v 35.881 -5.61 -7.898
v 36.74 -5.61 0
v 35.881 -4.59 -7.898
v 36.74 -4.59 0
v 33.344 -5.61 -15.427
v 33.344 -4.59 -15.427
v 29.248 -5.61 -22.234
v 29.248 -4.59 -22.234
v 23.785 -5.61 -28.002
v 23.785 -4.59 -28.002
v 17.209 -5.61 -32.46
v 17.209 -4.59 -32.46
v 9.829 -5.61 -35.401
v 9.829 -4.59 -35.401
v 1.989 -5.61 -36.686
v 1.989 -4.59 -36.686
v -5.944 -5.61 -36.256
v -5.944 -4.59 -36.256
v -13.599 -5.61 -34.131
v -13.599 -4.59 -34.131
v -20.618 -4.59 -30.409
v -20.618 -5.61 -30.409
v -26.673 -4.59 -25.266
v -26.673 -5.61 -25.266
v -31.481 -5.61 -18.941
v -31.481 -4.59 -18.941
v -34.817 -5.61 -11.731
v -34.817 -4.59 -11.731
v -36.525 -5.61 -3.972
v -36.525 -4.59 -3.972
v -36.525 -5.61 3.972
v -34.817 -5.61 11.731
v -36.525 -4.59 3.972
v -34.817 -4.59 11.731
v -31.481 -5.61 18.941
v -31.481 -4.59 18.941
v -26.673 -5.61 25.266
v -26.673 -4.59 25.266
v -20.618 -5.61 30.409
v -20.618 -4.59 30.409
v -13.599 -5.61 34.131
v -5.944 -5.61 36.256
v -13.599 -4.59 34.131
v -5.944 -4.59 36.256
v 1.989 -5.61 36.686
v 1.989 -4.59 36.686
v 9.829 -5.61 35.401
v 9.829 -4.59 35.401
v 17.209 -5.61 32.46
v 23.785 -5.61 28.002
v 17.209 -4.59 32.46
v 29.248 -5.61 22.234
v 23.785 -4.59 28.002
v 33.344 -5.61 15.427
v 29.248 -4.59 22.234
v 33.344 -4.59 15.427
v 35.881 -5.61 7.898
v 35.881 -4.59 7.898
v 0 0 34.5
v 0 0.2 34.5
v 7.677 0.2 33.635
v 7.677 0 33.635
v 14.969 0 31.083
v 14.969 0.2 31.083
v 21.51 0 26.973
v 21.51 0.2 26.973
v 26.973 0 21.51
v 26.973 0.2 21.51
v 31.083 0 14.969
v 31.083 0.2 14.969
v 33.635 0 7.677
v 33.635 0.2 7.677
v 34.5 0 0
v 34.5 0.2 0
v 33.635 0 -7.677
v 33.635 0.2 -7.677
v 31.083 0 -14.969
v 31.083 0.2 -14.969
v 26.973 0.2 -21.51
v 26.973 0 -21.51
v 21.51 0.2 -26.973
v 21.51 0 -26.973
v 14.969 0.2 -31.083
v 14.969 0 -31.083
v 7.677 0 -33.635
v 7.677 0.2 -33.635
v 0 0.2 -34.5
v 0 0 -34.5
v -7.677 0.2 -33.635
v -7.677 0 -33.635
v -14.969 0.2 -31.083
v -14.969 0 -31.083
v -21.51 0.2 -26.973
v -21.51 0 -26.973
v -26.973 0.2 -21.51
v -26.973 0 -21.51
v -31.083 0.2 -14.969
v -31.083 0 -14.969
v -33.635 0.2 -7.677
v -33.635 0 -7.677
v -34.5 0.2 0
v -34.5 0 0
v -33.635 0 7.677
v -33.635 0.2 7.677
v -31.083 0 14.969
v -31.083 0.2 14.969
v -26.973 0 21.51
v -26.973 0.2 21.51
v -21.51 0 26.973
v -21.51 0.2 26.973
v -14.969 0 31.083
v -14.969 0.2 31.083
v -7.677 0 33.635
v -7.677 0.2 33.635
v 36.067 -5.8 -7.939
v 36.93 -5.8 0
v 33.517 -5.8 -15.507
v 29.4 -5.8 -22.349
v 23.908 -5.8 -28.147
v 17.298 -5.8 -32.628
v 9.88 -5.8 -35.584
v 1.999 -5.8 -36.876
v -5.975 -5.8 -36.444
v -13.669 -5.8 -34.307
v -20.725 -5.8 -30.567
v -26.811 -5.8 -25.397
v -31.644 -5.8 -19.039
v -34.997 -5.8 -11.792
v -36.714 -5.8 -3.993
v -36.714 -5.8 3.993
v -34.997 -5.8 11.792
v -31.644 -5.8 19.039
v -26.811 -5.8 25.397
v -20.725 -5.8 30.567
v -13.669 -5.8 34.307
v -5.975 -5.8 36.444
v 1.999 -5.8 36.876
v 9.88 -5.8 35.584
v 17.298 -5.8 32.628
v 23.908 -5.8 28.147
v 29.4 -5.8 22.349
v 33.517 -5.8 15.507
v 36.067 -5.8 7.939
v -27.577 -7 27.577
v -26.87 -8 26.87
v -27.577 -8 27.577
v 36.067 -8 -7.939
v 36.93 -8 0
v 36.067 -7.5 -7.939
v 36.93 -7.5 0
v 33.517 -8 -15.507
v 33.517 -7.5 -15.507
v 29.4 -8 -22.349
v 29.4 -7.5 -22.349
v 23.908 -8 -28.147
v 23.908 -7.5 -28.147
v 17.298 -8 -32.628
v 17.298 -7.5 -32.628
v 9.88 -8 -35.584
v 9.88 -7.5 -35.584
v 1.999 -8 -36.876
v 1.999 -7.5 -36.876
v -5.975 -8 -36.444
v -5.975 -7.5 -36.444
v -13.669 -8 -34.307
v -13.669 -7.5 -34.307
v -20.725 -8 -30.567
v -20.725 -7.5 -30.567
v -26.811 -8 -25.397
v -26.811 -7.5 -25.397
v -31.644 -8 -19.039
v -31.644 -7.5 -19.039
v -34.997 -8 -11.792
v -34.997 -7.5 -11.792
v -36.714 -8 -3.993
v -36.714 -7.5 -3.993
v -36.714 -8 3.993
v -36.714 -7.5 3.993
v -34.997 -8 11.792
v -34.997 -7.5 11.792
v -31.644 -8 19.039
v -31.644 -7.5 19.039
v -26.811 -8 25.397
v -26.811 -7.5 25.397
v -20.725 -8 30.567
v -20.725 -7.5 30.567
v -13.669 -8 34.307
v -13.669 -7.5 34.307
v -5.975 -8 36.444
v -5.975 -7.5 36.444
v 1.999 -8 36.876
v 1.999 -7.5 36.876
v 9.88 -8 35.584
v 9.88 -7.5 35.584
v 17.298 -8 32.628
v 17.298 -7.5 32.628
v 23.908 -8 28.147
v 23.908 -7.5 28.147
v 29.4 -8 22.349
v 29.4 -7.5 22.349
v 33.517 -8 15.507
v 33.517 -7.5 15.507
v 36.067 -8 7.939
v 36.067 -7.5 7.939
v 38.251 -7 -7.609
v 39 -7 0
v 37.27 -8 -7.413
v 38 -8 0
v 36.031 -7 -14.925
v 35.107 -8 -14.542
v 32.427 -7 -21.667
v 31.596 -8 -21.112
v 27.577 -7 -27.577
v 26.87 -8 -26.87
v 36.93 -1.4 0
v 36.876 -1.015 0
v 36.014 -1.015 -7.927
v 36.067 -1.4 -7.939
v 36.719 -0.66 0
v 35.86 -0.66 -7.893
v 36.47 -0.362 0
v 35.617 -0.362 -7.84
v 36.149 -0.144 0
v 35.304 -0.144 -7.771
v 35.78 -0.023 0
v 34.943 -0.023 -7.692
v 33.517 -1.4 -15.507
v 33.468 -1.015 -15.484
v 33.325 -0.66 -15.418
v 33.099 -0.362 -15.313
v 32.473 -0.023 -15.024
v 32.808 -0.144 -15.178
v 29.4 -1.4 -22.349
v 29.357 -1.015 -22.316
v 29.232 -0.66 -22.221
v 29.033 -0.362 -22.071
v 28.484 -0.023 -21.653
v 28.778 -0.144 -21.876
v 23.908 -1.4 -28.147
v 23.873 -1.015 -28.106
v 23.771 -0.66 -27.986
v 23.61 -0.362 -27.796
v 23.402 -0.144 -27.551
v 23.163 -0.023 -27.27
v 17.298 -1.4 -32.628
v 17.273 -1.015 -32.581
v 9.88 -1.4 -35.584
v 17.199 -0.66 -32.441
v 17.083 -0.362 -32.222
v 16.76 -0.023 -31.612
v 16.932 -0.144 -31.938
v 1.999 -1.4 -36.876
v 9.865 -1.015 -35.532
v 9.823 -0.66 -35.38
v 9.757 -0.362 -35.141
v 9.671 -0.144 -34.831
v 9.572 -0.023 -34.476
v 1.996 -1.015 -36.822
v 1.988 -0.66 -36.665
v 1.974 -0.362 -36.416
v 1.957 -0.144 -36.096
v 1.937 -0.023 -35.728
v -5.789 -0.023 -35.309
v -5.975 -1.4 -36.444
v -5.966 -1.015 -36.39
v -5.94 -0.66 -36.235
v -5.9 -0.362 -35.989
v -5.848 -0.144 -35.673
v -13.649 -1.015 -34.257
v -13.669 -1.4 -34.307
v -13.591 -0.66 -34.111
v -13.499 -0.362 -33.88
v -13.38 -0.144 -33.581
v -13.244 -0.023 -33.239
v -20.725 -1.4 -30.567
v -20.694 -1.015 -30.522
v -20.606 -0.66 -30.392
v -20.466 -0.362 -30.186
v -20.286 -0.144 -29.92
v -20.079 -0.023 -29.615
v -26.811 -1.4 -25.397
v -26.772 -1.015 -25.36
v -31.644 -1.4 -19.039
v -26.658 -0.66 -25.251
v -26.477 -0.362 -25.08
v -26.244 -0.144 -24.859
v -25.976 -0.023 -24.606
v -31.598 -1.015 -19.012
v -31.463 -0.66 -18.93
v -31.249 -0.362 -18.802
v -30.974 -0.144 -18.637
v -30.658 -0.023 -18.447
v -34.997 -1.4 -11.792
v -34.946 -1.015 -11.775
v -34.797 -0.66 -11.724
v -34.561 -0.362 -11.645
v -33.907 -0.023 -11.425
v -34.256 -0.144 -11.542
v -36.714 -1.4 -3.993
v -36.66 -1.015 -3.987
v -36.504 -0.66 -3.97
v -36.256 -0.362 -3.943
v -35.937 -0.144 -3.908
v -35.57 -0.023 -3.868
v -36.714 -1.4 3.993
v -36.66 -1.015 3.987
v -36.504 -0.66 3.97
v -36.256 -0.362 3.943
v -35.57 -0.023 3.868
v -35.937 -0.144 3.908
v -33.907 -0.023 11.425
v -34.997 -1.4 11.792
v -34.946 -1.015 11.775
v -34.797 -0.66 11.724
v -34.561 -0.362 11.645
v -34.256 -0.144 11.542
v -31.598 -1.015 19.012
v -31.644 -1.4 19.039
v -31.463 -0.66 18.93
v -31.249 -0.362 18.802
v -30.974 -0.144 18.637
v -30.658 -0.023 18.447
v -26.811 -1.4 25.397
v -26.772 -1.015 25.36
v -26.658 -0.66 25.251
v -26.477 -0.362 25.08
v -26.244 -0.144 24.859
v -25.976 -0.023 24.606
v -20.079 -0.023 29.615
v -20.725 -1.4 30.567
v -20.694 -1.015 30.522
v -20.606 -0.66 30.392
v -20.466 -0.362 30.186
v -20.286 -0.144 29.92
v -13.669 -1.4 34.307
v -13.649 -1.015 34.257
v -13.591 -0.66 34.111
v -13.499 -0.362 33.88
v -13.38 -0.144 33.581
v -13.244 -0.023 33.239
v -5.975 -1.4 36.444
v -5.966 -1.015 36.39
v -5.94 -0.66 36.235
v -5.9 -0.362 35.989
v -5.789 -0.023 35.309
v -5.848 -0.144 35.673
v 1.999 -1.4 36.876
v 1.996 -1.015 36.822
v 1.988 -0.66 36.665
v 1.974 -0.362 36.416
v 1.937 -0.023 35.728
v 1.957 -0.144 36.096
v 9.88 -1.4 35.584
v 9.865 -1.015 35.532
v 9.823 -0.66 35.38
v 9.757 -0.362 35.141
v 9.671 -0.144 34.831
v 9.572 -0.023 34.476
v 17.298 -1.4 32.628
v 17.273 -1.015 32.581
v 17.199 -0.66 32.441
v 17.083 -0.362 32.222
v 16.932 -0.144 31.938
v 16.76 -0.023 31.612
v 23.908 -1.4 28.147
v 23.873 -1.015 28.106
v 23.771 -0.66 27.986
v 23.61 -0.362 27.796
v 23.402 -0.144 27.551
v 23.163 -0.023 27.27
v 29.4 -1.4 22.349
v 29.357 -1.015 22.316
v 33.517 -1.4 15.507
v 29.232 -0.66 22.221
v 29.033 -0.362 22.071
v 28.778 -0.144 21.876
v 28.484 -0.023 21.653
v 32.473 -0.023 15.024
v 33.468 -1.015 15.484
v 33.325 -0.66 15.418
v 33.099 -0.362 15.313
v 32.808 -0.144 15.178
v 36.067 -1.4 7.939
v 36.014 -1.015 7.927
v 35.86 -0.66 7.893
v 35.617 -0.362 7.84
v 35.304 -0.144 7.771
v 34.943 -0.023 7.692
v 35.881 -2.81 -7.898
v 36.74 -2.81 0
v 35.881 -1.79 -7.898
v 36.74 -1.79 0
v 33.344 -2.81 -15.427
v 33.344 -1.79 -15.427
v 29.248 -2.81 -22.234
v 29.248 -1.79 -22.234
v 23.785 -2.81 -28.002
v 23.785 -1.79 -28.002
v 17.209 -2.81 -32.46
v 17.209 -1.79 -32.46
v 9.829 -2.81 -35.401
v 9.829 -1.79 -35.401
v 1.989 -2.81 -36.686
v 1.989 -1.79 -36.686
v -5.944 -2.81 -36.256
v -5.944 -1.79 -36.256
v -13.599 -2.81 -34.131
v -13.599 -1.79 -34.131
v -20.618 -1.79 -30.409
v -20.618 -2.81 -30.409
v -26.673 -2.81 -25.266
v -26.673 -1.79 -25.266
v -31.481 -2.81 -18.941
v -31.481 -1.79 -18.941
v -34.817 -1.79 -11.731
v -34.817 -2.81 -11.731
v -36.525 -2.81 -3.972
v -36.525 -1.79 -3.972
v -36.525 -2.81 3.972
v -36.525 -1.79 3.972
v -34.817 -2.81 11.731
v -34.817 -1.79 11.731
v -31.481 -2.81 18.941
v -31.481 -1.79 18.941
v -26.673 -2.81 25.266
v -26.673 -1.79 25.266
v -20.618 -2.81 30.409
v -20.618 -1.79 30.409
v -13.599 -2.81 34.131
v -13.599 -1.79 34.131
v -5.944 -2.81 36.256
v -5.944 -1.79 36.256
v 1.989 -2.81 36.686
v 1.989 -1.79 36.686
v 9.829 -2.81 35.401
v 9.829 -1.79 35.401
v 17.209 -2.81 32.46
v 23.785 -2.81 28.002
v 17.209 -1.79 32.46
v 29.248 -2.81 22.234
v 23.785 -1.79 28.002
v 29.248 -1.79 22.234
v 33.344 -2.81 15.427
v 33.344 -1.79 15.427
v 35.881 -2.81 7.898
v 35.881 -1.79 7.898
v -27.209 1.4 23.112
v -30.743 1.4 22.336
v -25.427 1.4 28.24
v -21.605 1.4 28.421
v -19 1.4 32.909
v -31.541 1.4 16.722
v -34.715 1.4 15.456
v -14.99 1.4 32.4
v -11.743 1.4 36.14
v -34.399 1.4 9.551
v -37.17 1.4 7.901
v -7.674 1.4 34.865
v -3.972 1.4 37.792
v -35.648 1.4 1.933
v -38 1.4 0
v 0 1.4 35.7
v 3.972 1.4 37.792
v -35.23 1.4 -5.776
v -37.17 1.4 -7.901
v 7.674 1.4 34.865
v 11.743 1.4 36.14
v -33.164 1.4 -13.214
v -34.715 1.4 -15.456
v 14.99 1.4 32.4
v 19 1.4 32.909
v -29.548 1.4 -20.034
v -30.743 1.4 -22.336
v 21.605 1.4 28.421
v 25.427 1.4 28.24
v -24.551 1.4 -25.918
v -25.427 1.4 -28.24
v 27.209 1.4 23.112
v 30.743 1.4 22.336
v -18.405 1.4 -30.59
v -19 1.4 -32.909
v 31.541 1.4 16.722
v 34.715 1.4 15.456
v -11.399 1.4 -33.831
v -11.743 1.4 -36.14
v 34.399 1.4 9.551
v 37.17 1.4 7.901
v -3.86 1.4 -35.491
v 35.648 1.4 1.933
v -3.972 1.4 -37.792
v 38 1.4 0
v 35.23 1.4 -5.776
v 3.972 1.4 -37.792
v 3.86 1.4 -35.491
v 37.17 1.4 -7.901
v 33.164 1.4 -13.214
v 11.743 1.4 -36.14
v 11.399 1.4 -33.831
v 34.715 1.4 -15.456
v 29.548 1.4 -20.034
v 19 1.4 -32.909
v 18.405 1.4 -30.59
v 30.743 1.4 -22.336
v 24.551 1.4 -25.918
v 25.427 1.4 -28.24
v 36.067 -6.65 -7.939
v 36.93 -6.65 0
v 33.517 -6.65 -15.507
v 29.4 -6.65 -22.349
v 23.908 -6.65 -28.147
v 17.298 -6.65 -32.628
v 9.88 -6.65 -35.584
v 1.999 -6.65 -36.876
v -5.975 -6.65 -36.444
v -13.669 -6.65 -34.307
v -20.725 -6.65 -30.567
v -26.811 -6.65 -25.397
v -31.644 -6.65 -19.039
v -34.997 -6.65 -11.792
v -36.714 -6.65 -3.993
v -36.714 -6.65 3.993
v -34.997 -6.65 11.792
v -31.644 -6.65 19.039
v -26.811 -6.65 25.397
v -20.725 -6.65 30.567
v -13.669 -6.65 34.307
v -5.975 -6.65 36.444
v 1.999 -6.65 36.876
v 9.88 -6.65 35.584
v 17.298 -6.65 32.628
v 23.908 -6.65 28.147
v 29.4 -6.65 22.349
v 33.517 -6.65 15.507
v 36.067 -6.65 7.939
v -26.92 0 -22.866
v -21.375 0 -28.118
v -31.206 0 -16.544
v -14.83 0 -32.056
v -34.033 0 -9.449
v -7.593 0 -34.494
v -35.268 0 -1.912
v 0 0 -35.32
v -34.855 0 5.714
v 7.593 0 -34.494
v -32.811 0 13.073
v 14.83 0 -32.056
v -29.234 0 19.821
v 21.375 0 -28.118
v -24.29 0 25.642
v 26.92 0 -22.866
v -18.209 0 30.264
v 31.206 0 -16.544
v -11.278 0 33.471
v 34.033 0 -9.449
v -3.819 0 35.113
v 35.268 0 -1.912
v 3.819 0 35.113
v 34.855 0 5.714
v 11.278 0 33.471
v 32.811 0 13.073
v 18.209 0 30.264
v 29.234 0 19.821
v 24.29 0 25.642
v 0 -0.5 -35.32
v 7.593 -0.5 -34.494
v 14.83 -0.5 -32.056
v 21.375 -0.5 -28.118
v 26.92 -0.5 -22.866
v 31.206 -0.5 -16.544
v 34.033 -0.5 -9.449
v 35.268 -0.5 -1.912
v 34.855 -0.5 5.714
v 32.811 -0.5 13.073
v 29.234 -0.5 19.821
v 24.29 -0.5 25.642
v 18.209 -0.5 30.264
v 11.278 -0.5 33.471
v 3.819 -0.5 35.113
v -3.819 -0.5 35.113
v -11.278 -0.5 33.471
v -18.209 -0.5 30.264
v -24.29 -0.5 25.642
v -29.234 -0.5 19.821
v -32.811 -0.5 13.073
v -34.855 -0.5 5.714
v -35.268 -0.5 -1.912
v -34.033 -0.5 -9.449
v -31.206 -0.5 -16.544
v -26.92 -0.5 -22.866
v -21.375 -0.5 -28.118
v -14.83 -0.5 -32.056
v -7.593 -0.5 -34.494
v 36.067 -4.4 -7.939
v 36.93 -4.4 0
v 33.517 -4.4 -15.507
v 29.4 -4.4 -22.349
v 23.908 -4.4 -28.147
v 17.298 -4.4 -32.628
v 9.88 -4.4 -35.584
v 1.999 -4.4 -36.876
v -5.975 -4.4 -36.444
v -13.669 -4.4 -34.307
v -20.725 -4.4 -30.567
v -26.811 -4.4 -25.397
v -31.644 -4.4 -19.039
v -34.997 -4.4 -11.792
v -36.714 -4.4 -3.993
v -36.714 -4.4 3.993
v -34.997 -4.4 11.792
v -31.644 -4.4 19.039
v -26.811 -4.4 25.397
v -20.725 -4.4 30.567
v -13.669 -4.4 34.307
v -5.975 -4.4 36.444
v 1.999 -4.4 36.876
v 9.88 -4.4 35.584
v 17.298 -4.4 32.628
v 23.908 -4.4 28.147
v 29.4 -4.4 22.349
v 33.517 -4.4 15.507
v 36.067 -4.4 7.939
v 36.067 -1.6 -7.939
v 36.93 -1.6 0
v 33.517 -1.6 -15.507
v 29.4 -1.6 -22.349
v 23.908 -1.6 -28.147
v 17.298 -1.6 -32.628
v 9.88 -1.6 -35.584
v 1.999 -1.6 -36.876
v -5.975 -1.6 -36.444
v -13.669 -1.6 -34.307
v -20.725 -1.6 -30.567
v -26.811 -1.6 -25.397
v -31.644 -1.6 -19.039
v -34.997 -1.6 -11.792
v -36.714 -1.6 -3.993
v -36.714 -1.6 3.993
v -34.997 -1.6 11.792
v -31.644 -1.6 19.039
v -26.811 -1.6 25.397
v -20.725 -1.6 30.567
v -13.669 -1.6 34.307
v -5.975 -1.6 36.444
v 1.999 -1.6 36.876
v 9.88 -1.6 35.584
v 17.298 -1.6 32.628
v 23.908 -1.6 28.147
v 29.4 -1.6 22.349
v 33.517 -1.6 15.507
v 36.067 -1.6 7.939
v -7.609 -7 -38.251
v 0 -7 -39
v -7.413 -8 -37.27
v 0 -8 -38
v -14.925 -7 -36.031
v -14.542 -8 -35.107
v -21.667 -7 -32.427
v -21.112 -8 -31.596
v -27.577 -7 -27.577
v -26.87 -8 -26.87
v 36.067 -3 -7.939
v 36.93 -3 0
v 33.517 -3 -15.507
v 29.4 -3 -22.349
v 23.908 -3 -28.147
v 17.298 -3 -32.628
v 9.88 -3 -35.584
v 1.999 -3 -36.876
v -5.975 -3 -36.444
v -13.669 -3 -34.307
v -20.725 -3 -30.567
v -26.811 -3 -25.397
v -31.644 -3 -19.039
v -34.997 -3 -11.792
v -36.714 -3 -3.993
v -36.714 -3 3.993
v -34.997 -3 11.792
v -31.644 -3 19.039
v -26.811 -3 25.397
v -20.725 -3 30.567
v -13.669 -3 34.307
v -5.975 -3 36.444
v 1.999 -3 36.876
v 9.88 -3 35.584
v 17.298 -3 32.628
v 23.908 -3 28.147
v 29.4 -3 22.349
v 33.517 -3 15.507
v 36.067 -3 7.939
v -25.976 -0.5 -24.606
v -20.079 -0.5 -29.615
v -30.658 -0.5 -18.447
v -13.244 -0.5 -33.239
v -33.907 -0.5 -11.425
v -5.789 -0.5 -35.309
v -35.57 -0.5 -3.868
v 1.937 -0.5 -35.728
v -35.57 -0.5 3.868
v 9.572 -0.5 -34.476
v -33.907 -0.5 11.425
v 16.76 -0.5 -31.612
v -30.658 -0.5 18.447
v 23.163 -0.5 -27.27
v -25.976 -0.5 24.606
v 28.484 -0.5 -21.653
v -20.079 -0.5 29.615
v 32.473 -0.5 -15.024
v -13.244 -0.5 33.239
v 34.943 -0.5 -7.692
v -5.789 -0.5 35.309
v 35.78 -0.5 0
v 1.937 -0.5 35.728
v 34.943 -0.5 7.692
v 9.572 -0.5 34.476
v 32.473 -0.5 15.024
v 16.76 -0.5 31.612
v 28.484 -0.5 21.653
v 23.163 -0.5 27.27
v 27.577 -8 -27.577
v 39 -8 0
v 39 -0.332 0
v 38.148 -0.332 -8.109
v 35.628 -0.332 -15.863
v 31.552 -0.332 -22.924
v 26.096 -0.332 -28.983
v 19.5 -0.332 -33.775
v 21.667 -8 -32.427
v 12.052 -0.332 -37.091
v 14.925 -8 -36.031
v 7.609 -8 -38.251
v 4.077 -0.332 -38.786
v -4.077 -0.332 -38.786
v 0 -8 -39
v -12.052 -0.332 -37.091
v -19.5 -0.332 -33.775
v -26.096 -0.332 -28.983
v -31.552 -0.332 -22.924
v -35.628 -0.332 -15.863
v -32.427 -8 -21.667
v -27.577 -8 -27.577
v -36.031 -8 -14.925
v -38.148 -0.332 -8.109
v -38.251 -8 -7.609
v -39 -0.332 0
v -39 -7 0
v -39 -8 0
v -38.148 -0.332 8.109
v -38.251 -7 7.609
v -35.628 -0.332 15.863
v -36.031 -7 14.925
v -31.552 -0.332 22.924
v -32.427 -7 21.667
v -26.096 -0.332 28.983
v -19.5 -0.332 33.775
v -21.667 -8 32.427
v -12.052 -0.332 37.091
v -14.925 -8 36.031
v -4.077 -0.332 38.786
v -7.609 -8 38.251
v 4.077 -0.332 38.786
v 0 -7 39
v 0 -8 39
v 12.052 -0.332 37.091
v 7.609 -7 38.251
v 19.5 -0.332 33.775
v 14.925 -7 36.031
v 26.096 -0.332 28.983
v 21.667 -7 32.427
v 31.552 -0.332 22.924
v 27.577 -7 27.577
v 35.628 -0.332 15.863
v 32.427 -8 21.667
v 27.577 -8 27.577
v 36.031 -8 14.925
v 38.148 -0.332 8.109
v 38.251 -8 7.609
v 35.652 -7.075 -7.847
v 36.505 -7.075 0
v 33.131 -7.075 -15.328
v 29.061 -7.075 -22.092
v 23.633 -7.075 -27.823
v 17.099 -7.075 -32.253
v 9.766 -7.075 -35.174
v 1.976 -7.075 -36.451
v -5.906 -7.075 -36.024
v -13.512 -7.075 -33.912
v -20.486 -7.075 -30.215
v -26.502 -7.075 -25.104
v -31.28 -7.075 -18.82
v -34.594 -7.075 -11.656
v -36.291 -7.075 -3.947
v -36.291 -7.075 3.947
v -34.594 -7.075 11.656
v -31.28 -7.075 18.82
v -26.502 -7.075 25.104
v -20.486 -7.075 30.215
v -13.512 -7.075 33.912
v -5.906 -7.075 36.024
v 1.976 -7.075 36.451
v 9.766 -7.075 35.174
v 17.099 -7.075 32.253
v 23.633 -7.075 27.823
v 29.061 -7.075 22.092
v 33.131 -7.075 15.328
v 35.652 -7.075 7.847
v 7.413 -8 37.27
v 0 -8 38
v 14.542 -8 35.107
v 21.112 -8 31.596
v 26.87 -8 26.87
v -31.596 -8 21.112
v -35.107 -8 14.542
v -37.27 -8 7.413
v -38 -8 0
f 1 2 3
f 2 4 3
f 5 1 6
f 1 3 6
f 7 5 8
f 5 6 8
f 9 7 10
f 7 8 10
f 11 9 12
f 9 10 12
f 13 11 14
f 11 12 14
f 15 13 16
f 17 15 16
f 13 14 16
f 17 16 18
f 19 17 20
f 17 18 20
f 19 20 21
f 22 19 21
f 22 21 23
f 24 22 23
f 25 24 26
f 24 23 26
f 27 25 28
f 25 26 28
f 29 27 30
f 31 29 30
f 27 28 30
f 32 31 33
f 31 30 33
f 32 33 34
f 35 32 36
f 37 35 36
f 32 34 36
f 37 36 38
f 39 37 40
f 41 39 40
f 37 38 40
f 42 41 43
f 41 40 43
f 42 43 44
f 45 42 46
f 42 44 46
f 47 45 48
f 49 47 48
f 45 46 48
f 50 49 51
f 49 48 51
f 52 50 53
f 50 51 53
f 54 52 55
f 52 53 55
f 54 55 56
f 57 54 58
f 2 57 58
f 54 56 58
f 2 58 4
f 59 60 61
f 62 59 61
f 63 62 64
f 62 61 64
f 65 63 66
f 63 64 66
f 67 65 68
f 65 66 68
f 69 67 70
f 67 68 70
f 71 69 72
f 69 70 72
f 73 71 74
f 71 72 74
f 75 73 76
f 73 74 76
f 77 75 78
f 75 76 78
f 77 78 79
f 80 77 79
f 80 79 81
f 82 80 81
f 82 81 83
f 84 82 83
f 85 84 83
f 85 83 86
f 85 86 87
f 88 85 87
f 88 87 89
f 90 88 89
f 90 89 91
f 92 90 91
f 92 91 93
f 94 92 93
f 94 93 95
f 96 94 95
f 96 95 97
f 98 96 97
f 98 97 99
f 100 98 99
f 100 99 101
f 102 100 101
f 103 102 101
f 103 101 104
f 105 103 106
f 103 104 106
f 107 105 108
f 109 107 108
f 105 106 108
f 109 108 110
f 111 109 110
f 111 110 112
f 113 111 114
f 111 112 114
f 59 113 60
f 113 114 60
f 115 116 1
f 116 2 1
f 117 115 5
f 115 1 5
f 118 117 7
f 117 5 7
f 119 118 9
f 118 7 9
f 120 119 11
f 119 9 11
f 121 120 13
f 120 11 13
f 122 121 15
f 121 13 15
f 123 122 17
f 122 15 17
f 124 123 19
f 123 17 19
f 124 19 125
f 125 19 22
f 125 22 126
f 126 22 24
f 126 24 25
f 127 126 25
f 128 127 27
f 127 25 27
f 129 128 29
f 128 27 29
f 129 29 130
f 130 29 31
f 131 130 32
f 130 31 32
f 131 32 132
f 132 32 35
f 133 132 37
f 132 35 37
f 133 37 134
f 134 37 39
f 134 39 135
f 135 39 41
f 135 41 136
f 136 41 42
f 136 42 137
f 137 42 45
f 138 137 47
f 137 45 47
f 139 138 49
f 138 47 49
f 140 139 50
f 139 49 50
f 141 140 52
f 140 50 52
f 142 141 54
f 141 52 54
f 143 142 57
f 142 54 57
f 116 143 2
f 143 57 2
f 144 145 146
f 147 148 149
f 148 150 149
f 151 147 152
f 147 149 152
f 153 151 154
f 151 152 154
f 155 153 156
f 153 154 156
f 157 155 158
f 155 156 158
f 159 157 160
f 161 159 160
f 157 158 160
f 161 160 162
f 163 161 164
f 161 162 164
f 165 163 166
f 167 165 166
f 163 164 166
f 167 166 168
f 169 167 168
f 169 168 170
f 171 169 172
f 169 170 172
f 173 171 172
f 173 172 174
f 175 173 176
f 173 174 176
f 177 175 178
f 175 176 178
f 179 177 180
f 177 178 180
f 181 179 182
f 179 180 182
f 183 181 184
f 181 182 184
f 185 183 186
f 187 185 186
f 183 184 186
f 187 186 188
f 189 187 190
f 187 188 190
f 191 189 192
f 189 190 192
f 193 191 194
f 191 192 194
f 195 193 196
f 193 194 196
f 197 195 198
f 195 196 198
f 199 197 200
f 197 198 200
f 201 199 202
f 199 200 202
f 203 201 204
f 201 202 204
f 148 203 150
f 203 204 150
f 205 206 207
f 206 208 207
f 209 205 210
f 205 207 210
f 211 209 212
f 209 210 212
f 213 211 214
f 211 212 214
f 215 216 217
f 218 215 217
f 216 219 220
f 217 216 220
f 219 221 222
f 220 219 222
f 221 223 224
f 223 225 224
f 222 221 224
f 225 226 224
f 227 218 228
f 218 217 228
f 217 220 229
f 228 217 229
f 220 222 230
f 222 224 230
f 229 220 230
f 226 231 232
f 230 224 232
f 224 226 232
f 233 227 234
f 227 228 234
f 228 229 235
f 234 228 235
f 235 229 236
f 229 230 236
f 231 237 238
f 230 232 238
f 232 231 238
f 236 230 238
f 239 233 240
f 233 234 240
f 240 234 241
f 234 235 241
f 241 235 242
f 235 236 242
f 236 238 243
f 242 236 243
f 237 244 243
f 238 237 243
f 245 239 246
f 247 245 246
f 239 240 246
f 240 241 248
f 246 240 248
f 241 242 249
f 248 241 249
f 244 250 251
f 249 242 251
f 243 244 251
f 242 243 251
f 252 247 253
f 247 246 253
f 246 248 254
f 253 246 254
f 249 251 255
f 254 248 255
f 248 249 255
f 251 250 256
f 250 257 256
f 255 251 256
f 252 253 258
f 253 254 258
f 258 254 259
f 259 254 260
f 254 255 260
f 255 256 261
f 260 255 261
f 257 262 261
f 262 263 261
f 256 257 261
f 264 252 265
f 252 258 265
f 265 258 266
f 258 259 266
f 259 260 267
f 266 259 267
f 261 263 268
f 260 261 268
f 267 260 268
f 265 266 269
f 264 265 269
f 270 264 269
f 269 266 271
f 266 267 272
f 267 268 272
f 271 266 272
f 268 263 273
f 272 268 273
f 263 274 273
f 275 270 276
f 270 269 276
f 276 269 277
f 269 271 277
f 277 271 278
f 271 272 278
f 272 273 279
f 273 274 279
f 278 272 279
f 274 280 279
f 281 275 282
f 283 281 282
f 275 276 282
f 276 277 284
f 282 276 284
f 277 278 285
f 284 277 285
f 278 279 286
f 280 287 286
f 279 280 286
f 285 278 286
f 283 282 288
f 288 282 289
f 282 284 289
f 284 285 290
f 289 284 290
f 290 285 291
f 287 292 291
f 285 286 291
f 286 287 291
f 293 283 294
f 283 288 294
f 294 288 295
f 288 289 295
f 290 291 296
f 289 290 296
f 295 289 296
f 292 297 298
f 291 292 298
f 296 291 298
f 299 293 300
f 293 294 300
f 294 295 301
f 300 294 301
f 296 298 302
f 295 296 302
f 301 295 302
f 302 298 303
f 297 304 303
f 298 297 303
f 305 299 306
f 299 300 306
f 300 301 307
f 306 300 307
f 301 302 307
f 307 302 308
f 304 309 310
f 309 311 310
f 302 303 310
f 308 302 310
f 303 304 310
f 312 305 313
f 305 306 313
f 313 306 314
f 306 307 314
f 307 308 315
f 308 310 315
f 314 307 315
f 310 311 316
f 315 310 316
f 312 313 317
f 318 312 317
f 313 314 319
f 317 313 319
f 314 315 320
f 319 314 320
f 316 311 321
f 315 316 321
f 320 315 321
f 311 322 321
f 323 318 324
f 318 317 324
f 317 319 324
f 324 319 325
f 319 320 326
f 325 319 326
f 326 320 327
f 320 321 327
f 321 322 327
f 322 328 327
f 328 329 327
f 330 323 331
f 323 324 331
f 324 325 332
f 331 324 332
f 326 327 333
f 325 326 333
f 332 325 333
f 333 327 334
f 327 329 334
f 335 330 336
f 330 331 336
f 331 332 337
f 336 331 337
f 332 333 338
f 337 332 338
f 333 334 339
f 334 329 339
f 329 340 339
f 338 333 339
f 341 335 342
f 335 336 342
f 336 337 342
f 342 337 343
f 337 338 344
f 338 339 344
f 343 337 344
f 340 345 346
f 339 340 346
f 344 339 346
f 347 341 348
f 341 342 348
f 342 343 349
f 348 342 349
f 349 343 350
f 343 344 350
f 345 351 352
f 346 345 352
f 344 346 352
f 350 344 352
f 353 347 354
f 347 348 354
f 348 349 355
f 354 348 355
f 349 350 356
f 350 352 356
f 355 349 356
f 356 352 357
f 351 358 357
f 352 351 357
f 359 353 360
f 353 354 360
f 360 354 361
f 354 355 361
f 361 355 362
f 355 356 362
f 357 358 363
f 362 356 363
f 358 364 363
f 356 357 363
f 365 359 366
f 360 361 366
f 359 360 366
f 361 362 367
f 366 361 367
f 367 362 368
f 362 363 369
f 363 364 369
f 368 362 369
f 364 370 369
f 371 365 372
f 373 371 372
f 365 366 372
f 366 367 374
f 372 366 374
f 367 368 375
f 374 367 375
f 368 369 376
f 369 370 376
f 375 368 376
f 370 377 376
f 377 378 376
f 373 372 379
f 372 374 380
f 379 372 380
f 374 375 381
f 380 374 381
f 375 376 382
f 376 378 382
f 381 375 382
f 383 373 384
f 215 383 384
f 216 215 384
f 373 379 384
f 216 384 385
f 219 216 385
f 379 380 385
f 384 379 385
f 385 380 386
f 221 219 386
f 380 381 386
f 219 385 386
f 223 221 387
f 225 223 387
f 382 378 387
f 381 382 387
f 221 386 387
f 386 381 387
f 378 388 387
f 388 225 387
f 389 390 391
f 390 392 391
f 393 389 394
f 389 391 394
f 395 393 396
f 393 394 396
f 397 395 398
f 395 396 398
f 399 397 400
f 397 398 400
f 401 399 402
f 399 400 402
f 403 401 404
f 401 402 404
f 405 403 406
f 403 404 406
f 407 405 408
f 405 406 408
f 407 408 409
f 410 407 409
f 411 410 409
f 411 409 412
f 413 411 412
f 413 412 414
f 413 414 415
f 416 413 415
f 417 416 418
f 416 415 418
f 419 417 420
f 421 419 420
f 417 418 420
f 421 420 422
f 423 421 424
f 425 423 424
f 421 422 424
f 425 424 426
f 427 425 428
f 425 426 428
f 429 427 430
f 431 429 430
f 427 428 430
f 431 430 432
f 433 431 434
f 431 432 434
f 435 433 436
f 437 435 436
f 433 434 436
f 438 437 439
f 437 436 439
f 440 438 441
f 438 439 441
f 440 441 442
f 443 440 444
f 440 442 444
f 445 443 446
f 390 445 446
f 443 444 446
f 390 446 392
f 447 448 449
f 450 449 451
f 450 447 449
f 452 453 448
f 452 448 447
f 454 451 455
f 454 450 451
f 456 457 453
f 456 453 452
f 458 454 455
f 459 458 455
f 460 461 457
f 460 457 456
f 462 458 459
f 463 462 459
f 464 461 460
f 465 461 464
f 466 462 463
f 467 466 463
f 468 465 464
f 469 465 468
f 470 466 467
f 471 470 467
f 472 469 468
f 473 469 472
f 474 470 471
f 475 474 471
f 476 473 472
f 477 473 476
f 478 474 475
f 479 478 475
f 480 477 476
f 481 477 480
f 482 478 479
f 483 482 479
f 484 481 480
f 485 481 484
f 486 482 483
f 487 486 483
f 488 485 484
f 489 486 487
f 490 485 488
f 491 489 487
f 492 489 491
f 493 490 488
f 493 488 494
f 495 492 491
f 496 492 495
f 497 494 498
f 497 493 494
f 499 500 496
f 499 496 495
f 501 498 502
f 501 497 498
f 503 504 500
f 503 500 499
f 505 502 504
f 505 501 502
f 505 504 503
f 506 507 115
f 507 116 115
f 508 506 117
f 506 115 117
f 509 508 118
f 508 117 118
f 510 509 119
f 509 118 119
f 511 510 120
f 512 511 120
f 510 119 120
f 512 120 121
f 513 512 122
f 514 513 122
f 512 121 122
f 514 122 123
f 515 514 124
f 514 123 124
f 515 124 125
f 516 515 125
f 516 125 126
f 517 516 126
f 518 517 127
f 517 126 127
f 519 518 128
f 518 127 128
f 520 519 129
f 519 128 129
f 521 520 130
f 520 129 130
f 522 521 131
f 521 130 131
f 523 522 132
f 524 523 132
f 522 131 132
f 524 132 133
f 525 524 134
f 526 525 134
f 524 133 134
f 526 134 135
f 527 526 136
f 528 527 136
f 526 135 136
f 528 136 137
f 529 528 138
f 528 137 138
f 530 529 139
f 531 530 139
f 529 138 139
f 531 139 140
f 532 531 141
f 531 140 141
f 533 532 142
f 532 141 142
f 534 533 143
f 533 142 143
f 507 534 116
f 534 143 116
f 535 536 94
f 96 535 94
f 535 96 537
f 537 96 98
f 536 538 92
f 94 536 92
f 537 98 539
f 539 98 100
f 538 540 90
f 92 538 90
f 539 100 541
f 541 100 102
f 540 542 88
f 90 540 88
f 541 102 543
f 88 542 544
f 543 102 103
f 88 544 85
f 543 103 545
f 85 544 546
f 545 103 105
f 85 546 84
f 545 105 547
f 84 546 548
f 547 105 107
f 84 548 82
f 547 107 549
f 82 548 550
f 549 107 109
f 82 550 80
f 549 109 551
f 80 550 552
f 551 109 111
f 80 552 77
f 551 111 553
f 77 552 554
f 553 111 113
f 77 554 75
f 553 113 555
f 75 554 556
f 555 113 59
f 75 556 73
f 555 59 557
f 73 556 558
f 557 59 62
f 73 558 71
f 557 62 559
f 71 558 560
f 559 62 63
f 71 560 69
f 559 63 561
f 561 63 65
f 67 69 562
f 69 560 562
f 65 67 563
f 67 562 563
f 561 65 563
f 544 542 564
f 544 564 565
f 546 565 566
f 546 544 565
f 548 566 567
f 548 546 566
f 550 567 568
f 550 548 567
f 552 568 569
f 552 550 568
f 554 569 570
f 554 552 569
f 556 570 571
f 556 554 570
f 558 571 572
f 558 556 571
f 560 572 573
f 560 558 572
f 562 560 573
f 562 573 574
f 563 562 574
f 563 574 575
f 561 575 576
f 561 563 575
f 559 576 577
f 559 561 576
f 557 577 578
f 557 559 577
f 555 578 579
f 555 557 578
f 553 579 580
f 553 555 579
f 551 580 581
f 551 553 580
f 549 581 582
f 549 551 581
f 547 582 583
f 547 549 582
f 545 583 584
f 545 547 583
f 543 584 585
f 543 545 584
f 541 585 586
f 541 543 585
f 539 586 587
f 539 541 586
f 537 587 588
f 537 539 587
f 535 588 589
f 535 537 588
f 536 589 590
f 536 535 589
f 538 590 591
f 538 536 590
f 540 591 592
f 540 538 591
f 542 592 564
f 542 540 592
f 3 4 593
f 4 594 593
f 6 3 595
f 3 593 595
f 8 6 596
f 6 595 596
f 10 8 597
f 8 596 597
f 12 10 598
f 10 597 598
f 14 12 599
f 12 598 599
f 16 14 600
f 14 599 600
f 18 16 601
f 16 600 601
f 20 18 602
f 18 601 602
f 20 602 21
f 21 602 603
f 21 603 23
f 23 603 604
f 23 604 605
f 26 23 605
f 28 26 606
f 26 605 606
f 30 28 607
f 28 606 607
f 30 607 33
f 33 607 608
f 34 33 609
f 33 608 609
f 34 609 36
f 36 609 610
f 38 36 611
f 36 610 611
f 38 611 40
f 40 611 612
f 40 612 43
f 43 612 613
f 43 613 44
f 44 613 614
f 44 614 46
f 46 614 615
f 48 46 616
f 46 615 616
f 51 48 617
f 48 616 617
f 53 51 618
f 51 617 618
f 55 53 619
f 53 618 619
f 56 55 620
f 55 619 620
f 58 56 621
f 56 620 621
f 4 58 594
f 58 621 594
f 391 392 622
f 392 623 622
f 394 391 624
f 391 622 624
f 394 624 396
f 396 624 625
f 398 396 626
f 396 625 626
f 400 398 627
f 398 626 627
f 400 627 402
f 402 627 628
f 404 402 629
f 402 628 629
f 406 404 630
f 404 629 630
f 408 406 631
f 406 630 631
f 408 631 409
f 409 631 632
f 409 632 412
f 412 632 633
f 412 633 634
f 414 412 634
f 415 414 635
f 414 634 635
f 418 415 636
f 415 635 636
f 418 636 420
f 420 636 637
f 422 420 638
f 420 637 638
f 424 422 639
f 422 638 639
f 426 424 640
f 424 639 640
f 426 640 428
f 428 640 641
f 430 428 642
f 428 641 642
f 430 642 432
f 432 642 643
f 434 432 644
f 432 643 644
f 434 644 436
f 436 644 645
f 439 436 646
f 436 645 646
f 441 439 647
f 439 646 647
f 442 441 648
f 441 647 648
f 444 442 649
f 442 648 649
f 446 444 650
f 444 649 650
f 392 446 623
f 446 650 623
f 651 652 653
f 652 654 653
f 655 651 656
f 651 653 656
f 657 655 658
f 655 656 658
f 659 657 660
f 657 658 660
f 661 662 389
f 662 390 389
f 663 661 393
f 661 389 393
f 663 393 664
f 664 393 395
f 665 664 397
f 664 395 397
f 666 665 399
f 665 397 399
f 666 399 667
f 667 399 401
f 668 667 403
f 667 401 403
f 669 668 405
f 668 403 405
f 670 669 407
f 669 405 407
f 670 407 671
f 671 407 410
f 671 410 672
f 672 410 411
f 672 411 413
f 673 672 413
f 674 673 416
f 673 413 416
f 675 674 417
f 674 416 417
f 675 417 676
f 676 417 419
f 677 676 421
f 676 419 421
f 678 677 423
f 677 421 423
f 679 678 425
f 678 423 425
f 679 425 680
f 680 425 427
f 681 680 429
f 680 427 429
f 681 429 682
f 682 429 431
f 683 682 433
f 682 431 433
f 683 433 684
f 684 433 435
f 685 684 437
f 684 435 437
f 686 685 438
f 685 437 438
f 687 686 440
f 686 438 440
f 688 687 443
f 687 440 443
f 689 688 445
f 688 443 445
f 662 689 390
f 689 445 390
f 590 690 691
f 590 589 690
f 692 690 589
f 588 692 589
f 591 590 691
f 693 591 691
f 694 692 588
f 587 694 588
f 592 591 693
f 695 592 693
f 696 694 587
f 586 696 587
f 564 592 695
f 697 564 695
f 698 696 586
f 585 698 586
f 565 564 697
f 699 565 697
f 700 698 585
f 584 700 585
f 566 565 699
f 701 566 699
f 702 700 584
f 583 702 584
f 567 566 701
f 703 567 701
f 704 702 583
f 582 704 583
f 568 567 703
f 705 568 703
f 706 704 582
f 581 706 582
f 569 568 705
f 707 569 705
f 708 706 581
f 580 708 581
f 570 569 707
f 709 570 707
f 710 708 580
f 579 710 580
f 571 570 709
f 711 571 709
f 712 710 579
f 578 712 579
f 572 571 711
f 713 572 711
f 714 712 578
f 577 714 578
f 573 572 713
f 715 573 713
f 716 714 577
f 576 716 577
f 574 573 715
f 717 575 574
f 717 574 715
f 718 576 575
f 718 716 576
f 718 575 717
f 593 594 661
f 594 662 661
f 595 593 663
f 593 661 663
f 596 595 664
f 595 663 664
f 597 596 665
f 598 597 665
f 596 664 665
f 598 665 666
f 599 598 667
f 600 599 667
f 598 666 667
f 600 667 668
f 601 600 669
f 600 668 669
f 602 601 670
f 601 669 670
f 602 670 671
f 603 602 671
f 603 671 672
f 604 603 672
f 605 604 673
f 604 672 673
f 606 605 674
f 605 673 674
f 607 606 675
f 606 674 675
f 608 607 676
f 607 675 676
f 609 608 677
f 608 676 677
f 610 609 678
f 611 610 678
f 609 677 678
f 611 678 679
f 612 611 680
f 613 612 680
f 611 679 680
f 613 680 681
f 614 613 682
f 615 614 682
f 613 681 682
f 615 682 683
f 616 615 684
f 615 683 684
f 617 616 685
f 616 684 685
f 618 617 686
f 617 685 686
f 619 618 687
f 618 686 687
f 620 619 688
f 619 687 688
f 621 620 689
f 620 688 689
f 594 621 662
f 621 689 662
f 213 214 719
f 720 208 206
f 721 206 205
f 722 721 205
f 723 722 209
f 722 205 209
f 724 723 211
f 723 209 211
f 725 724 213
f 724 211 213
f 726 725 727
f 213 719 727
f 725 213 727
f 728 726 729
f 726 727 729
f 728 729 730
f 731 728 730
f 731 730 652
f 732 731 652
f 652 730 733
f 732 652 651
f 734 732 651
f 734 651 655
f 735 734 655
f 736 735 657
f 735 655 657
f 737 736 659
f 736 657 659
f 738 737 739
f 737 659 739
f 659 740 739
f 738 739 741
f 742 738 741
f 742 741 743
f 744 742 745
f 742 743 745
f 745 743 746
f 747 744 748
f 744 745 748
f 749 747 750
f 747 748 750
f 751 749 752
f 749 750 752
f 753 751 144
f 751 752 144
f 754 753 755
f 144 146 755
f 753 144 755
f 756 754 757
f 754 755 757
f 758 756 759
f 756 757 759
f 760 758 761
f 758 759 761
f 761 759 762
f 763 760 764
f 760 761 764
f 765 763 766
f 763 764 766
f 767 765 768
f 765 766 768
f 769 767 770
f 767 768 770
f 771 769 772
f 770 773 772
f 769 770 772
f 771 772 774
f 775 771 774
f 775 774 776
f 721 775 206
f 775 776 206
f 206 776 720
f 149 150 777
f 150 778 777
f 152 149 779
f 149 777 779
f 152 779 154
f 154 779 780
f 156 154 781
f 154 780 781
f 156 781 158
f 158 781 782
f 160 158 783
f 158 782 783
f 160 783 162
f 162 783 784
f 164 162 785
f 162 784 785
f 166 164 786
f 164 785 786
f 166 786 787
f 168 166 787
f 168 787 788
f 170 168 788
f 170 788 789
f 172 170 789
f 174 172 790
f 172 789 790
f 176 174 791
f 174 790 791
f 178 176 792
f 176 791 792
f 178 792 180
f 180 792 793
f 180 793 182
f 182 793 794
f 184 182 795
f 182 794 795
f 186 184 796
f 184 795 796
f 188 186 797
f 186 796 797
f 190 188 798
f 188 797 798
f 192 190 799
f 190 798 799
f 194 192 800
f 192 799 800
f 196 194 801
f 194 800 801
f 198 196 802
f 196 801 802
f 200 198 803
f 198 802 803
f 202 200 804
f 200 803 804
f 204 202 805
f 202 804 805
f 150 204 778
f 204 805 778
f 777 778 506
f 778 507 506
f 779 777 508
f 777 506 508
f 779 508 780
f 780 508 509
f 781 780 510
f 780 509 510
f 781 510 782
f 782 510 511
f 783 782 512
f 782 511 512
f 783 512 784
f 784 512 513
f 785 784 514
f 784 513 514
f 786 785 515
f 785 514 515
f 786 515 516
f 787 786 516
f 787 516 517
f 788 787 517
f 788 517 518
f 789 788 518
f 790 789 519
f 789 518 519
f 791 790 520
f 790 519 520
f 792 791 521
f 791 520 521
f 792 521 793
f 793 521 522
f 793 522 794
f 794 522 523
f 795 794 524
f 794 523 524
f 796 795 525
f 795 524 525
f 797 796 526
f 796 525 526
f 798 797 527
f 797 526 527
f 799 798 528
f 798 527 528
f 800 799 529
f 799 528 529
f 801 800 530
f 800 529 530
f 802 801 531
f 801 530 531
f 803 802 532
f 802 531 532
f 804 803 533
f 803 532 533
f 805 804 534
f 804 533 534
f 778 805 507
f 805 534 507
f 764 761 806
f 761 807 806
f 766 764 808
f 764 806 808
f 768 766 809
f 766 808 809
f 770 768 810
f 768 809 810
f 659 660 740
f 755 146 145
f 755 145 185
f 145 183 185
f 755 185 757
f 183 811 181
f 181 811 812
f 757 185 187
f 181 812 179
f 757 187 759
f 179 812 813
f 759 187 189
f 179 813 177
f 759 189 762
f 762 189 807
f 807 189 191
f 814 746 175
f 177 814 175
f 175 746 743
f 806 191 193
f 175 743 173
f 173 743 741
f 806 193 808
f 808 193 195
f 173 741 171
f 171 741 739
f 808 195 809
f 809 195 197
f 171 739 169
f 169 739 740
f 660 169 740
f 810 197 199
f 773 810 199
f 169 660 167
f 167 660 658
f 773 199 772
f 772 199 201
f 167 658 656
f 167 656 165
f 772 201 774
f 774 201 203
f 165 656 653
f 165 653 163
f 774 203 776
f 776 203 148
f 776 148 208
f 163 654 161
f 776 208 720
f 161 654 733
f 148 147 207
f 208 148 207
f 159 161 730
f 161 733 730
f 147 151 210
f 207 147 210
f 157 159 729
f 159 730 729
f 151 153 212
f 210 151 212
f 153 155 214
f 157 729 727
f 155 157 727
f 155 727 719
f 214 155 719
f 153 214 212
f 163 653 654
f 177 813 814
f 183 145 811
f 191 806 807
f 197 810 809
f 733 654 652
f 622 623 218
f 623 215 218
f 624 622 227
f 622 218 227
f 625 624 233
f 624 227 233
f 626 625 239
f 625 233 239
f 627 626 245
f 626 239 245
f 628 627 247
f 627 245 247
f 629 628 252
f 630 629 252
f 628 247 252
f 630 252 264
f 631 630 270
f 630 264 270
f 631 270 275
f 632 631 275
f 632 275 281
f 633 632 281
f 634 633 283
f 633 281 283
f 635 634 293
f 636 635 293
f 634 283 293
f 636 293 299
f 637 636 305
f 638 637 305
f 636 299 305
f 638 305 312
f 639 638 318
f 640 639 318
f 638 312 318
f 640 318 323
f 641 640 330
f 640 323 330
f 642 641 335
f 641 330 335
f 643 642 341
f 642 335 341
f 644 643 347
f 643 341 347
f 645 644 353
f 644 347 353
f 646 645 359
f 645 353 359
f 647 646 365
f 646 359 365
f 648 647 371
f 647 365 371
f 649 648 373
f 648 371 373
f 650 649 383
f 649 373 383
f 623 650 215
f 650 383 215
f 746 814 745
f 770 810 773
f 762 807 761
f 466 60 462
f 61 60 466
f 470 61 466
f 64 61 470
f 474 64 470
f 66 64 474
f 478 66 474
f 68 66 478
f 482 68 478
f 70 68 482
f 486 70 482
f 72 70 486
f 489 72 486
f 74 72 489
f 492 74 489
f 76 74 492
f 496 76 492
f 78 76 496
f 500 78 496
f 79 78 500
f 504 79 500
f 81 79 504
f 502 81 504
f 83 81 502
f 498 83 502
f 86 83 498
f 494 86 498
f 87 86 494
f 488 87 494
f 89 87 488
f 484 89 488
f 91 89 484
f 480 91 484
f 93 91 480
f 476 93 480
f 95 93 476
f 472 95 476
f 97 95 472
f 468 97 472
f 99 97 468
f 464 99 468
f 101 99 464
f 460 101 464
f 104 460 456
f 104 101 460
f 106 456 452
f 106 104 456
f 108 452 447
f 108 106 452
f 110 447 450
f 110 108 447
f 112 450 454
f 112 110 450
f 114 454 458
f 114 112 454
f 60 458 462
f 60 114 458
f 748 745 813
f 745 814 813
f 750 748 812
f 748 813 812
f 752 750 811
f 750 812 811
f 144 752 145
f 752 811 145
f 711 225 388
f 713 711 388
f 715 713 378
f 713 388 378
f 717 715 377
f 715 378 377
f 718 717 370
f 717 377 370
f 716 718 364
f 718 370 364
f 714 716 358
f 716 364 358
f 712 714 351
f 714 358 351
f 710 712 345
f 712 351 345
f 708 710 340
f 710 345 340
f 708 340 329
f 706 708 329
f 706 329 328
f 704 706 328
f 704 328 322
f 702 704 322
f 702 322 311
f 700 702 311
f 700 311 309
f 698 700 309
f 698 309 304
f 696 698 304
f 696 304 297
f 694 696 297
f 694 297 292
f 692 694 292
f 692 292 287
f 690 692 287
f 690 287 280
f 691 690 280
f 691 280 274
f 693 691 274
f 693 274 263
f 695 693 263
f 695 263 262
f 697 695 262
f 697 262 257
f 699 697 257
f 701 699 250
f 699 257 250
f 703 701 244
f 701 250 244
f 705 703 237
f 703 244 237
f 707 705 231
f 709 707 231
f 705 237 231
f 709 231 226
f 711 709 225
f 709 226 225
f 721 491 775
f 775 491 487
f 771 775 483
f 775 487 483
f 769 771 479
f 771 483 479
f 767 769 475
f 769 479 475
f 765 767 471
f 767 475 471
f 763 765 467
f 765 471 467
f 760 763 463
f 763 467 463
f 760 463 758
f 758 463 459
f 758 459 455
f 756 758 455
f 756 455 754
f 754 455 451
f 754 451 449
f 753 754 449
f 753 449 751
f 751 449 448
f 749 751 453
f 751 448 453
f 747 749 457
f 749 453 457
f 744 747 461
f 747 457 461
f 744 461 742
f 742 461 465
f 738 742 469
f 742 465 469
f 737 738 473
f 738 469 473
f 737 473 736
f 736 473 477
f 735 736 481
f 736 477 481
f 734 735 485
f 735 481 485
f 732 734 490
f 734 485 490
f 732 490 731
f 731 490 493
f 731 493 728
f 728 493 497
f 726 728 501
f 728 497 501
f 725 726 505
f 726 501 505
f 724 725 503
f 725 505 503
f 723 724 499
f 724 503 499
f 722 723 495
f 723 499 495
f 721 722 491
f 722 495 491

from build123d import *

# Parameters (mm, degrees)
SKETCH_1_R               = 39
EXTRUDE_1_DEPTH          = 2
SKETCH_3_R               = 34.5
CUT_EXTRUDE_1_DEPTH      = 57.053545829
CUT_EXTRUDE_START        = -0.6
SKETCH_4_R               = 39
CUT_EXTRUDE_2_DEPTH      = 0.6
CHAMFER_1_SIZE           = 1.732
CHAMFER_1_SIZE2          = 0.999970666
CHAMFER_2_SIZE           = 1.2
CUT_REVOLVE_1_ANGLE      = 45
PATTERN_CIRCULAR_1_COUNT = 4
SKETCH_6_R               = 35.78
SKETCH_6_R_2             = 35.32
EXTRUDE_2_DEPTH          = 0.5


with BuildPart() as part:
    # 草图1 → 凸台-拉伸1 (new body)
    with BuildSketch(Plane(origin=(0, 0, 0), x_dir=(1, 0, 0), z_dir=(0, 1, 0))):
        with Locations(Location((0, 0, 0), (0, 0, 270))):
            Circle(SKETCH_1_R)
    extrude(amount=EXTRUDE_1_DEPTH)

    # 草图2 → 旋转1 (revolve)
    with BuildSketch(Plane(origin=(0, 0, 0), x_dir=(0.5000000000000016, 0, 0.8660254037844378), z_dir=(-0.8660254037844377, 0, 0.5000000000000014)), mode=Mode.PRIVATE) as revolve_1_sk:
        with BuildLine():
            Line((36.93, -8), (36.93, -7.5))
            Line((36.93, -7.5), (36.505, -7.075))
            Line((36.505, -7.075), (36.93, -6.65))
            Line((36.93, -6.65), (36.93, -5.8))
            Line((36.93, -5.8), (36.74, -5.61))
            Line((36.74, -5.61), (36.74, -4.59))
            Line((36.74, -4.59), (36.93, -4.4))
            Line((36.93, -4.4), (36.93, -3))
            Line((36.93, -3), (36.74, -2.81))
            Line((36.74, -2.81), (36.74, -1.79))
            Line((36.74, -1.79), (36.93, -1.6))
            Line((36.93, -1.6), (36.93, -1.4))
            ThreePointArc((36.93, -1.4), (36.519949494, -0.410050506), (35.53, 0))
            Line((35.53, 0), (39, 0))
            Line((39, 0), (39, -8))
            Line((39, -8), (36.93, -8))
        make_face()
    revolve(revolve_1_sk.sketch.rotate(Axis((0, 0, 0), (0, 1, 0)), 60), axis=Axis((0, 0, 0), (0, 1, 0)))

    # 草图3 → 切除-拉伸1 (cut, through all)
    with BuildSketch(Plane(origin=(0, 2, 0), x_dir=(1, 0, 0), z_dir=(0, 1, 0))):
        with Locations(Location((0, 0, 0), (0, 0, 270))):
            Circle(SKETCH_3_R)
    extrude(amount=-CUT_EXTRUDE_1_DEPTH, mode=Mode.SUBTRACT)

    # 草图4 → 切除-拉伸2 (cut)
    with BuildSketch(Plane(origin=(0, 2, 0), x_dir=(1, 0, 0), z_dir=(0, 1, 0)).offset(CUT_EXTRUDE_START)):
        Circle(SKETCH_4_R)
    extrude(amount=CUT_EXTRUDE_2_DEPTH, mode=Mode.SUBTRACT)

    # 倒角1
    chamfer_1_edges = [part.edges().sort_by_distance(p)[0] for p in [
        (0, 1.4, -39),
    ]]
    chamfer_1_side = [part.faces().sort_by_distance(p)[0] for p in [
        (-27.577164466, -3.3, -27.577164466),
    ]]
    chamfer(chamfer_1_edges, length=CHAMFER_1_SIZE, length2=CHAMFER_1_SIZE2, reference=chamfer_1_side[0])

    # 倒角2
    chamfer_2_edges = [part.edges().sort_by_distance(p)[0] for p in [
        (0, 1.4, -34.5),
    ]]
    chamfer(chamfer_2_edges, length=CHAMFER_2_SIZE)

    # 草图5 → 切除-旋转1 (revolve, cut)
    with BuildSketch(Plane.XY):
        Polygon((39, -8), (39, -7), (38, -8), align=None)
    cut_revolve_1 = revolve(axis=Axis((0, 0, 0), (0, 1, 0)), revolution_arc=CUT_REVOLVE_1_ANGLE, mode=Mode.SUBTRACT)

    # 阵列(圆周)1: 切除-旋转1 ×4 about axis
    pattern_circular_1_axis = Axis((0, 0, 0), (0, 1, 0))
    for i in range(1, PATTERN_CIRCULAR_1_COUNT):
        add(cut_revolve_1.rotate(pattern_circular_1_axis, i * 360 / PATTERN_CIRCULAR_1_COUNT), mode=Mode.SUBTRACT)

    # 草图6 → 凸台-拉伸2 (add)
    with BuildSketch(Plane.XZ):
        Circle(SKETCH_6_R)
        with Locations(Location((0, 0, 0), (0, 0, 270))):
            Circle(SKETCH_6_R_2, mode=Mode.SUBTRACT)
    extrude(amount=EXTRUDE_2_DEPTH)


solid = part.part
